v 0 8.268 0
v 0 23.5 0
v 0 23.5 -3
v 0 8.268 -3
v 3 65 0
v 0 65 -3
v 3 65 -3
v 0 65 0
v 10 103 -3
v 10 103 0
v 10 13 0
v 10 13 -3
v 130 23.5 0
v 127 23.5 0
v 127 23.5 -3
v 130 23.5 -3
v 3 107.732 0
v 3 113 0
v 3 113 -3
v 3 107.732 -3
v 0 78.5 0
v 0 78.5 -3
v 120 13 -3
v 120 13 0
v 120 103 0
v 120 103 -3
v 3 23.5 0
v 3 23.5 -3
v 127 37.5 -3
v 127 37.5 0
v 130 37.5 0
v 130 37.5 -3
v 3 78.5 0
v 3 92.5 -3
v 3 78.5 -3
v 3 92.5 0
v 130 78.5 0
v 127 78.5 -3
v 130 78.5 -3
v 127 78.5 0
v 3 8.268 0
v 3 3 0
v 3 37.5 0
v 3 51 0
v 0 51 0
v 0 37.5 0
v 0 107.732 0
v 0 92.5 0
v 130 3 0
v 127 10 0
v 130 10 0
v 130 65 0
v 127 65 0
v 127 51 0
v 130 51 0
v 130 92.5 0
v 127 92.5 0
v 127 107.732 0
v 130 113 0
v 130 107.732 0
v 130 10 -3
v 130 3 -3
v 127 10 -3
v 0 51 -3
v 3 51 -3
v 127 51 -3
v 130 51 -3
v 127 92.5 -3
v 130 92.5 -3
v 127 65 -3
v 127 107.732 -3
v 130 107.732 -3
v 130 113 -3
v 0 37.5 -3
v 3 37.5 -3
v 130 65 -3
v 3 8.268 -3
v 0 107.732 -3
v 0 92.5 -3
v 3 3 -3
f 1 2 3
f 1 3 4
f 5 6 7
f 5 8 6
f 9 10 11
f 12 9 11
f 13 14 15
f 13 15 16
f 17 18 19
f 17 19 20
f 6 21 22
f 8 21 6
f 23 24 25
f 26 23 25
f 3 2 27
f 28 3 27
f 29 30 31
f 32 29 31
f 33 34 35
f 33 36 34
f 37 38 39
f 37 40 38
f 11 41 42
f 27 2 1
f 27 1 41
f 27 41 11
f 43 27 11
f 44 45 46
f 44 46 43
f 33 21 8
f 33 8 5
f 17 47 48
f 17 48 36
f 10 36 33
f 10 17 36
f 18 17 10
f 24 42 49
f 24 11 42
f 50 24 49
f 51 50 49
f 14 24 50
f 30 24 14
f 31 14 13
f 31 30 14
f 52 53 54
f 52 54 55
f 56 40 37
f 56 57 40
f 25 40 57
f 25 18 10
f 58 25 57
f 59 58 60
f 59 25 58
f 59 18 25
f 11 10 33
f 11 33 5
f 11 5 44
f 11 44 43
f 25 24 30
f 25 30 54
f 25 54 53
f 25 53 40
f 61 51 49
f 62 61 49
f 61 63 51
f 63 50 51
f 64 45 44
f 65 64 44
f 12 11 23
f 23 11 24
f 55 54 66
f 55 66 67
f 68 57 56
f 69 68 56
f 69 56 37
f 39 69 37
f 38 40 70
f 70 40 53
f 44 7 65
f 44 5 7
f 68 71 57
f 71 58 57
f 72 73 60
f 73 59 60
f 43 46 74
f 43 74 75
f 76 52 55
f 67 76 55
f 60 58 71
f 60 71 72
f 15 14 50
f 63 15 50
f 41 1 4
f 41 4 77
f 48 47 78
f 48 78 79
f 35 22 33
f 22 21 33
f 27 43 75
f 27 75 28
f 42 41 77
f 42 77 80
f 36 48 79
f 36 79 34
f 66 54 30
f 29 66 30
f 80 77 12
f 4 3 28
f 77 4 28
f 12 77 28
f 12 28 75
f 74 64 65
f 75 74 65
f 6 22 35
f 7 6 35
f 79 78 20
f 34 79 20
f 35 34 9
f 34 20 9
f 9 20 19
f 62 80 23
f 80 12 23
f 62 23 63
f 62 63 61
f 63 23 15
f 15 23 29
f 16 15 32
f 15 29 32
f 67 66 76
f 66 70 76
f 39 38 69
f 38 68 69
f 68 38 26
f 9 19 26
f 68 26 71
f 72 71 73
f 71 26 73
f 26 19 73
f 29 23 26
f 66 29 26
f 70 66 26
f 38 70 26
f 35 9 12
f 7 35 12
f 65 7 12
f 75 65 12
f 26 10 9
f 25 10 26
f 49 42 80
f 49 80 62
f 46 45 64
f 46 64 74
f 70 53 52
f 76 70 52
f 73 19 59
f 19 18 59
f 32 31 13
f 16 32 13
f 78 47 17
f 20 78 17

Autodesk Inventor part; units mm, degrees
ref_plane "YZ Plane" through (0, 0, 0) normal (1, 0, 0) x (0, 1, 0)
ref_plane "XZ Plane" through (0, 0, 0) normal (0, 1, 0) x (-1, 0, 0)
ref_plane "XY Plane" through (0, 0, 0) normal (0, 0, 1) x (1, 0, 0)
sketch "Boceto1" plane through (0, 0, 0) normal (0, 0, 1) x (1, 0, 0)
  line L0 (3, 3) -> (130, 3)
  line L1 (10, 103) -> (10, 13)
  line L2 (10, 13) -> (120, 13)
  line L3 (120, 13) -> (120, 103)
  line L4 (10, 103) -> (120, 103)
  line L5 (130, 113) -> (130, 106)
  line L6 (130, 106) -> (127, 107.7321)
  line L7 (130, 92.5) -> (127, 90.7679)
  line L8 (130, 65) -> (127, 63.2679)
  line L9 (130, 78.5) -> (127, 80.2321)
  line L10 (130, 10) -> (127, 8.2679)
  line L11 (130, 23.5) -> (127, 25.2321)
  line L12 (130, 51) -> (127, 52.7321)
  line L13 (130, 37.5) -> (127, 35.7679)
  line L14 (127, 107.7321) -> (127, 90.7679)
  line L15 (127, 80.2321) -> (127, 63.2679)
  line L16 (127, 52.7321) -> (127, 35.7679)
  line L17 (127, 25.2321) -> (127, 8.2679)
  line L18 (3, 113) -> (3, 106)
  line L19 (3, 106) -> (0, 107.7321)
  line L20 (3, 92.5) -> (0, 90.7679)
  line L21 (3, 65) -> (0, 63.2679)
  line L22 (3, 78.5) -> (0, 80.2321)
  line L23 (3, 10) -> (0, 8.2679)
  line L24 (3, 23.5) -> (0, 25.2321)
  line L25 (3, 37.5) -> (0, 35.7679)
  line L26 (3, 51) -> (0, 52.7321)
  line L27 (0, 107.7321) -> (0, 90.7679)
  line L28 (0, 80.2321) -> (0, 63.2679)
  line L29 (0, 52.7321) -> (0, 35.7679)
  line L30 (0, 25.2321) -> (0, 8.2679)
  line L31 (130, 113) -> (130, 106)
  line L32 (130, 92.5) -> (130, 85.5)
  line L33 (130, 113) -> (130, 106)
  line L34 (130, 113) -> (130, 106)
  line L35 (130, 92.5) -> (130, 78.5)
  line L36 (130, 92.5) -> (130, 78.5)
  line L37 (130, 65) -> (130, 58)
  line L38 (130, 65) -> (130, 51)
  line L39 (130, 37.5) -> (130, 23.5)
  line L40 (130, 10) -> (130, 3)
  line L41 (0, 8.2679) -> (0, 25.2321)
  line L42 (0, 35.7679) -> (0, 52.7321)
  line L43 (0, 63.2679) -> (0, 80.2321)
  line L44 (0, 90.7679) -> (0, 107.7321)
  line L45 (3, 113) -> (3, 106)
  line L46 (3, 92.5) -> (3, 85.5)
  line L47 (3, 113) -> (3, 106)
  line L48 (3, 113) -> (3, 106)
  line L49 (3, 92.5) -> (3, 78.5)
  line L50 (3, 92.5) -> (3, 78.5)
  line L51 (3, 65) -> (3, 58)
  line L52 (3, 65) -> (3, 51)
  line L53 (3, 37.5) -> (3, 23.5)
  line L54 (3, 10) -> (3, 3)
  line L55 (3, 113) -> (130, 113)
  line L56 (0, 107.7321) -> (3, 107.7321)
  line L57 (0, 92.5) -> (3, 92.5)
  line L58 (0, 78.5) -> (3, 78.5)
  line L59 (0, 65) -> (3, 65)
  line L60 (0, 51) -> (3, 51)
  line L61 (0, 37.5) -> (3, 37.5)
  line L62 (0, 23.5) -> (3, 23.5)
  line L63 (0, 8.2679) -> (3, 8.2679)
  line L64 (127, 107.7321) -> (130, 107.7321)
  line L65 (127, 92.5) -> (130, 92.5)
  line L66 (127, 78.5) -> (130, 78.5)
  line L67 (127, 65) -> (130, 65)
  line L68 (127, 51) -> (130, 51)
  line L69 (127, 37.5) -> (130, 37.5)
  line L70 (127, 23.5) -> (130, 23.5)
  line L71 (127, 10) -> (130, 10)
  line L72 (127, 8.2679) -> (130, 8.2679)
  point P0 (0, 0)
  point P1 (0, 58)
  point P2 (3, 3)
  point P3 (127, 99.25)
  dimension "d11" = 7
  dimension "d14" = 7
  dimension "d18" = 3
  dimension "d20" = 44.4641
  dimension "d21" = 7
  dimension "d22" = 65.5359
  dimension "d24" = 130
  dimension "d25" = 110
  dimension "d26" = 7
extrude "Extrusión1" add sketch "Boceto1" against normal blind 3 contours L54 L23 L30 L62 L53 L61 L29 L60 L52 L51 L59 L28 L58 L49 L46 L57 L27 L19 L18 L55 L5 L64 L14 L7 L32 L35 L9 L15 L8 L37 L38 L12 L16 L13 L39 L11 L17 L72 L40 L0 | L63 L23 L54 | L72 L10 L40 | L10 L17 L71 | L17 L11 L70 | L13 L16 L69 | L16 L12 L68 | L8 L15 L67 | L15 L9 L66 | L7 L14 L65 | L56 L18 L19
